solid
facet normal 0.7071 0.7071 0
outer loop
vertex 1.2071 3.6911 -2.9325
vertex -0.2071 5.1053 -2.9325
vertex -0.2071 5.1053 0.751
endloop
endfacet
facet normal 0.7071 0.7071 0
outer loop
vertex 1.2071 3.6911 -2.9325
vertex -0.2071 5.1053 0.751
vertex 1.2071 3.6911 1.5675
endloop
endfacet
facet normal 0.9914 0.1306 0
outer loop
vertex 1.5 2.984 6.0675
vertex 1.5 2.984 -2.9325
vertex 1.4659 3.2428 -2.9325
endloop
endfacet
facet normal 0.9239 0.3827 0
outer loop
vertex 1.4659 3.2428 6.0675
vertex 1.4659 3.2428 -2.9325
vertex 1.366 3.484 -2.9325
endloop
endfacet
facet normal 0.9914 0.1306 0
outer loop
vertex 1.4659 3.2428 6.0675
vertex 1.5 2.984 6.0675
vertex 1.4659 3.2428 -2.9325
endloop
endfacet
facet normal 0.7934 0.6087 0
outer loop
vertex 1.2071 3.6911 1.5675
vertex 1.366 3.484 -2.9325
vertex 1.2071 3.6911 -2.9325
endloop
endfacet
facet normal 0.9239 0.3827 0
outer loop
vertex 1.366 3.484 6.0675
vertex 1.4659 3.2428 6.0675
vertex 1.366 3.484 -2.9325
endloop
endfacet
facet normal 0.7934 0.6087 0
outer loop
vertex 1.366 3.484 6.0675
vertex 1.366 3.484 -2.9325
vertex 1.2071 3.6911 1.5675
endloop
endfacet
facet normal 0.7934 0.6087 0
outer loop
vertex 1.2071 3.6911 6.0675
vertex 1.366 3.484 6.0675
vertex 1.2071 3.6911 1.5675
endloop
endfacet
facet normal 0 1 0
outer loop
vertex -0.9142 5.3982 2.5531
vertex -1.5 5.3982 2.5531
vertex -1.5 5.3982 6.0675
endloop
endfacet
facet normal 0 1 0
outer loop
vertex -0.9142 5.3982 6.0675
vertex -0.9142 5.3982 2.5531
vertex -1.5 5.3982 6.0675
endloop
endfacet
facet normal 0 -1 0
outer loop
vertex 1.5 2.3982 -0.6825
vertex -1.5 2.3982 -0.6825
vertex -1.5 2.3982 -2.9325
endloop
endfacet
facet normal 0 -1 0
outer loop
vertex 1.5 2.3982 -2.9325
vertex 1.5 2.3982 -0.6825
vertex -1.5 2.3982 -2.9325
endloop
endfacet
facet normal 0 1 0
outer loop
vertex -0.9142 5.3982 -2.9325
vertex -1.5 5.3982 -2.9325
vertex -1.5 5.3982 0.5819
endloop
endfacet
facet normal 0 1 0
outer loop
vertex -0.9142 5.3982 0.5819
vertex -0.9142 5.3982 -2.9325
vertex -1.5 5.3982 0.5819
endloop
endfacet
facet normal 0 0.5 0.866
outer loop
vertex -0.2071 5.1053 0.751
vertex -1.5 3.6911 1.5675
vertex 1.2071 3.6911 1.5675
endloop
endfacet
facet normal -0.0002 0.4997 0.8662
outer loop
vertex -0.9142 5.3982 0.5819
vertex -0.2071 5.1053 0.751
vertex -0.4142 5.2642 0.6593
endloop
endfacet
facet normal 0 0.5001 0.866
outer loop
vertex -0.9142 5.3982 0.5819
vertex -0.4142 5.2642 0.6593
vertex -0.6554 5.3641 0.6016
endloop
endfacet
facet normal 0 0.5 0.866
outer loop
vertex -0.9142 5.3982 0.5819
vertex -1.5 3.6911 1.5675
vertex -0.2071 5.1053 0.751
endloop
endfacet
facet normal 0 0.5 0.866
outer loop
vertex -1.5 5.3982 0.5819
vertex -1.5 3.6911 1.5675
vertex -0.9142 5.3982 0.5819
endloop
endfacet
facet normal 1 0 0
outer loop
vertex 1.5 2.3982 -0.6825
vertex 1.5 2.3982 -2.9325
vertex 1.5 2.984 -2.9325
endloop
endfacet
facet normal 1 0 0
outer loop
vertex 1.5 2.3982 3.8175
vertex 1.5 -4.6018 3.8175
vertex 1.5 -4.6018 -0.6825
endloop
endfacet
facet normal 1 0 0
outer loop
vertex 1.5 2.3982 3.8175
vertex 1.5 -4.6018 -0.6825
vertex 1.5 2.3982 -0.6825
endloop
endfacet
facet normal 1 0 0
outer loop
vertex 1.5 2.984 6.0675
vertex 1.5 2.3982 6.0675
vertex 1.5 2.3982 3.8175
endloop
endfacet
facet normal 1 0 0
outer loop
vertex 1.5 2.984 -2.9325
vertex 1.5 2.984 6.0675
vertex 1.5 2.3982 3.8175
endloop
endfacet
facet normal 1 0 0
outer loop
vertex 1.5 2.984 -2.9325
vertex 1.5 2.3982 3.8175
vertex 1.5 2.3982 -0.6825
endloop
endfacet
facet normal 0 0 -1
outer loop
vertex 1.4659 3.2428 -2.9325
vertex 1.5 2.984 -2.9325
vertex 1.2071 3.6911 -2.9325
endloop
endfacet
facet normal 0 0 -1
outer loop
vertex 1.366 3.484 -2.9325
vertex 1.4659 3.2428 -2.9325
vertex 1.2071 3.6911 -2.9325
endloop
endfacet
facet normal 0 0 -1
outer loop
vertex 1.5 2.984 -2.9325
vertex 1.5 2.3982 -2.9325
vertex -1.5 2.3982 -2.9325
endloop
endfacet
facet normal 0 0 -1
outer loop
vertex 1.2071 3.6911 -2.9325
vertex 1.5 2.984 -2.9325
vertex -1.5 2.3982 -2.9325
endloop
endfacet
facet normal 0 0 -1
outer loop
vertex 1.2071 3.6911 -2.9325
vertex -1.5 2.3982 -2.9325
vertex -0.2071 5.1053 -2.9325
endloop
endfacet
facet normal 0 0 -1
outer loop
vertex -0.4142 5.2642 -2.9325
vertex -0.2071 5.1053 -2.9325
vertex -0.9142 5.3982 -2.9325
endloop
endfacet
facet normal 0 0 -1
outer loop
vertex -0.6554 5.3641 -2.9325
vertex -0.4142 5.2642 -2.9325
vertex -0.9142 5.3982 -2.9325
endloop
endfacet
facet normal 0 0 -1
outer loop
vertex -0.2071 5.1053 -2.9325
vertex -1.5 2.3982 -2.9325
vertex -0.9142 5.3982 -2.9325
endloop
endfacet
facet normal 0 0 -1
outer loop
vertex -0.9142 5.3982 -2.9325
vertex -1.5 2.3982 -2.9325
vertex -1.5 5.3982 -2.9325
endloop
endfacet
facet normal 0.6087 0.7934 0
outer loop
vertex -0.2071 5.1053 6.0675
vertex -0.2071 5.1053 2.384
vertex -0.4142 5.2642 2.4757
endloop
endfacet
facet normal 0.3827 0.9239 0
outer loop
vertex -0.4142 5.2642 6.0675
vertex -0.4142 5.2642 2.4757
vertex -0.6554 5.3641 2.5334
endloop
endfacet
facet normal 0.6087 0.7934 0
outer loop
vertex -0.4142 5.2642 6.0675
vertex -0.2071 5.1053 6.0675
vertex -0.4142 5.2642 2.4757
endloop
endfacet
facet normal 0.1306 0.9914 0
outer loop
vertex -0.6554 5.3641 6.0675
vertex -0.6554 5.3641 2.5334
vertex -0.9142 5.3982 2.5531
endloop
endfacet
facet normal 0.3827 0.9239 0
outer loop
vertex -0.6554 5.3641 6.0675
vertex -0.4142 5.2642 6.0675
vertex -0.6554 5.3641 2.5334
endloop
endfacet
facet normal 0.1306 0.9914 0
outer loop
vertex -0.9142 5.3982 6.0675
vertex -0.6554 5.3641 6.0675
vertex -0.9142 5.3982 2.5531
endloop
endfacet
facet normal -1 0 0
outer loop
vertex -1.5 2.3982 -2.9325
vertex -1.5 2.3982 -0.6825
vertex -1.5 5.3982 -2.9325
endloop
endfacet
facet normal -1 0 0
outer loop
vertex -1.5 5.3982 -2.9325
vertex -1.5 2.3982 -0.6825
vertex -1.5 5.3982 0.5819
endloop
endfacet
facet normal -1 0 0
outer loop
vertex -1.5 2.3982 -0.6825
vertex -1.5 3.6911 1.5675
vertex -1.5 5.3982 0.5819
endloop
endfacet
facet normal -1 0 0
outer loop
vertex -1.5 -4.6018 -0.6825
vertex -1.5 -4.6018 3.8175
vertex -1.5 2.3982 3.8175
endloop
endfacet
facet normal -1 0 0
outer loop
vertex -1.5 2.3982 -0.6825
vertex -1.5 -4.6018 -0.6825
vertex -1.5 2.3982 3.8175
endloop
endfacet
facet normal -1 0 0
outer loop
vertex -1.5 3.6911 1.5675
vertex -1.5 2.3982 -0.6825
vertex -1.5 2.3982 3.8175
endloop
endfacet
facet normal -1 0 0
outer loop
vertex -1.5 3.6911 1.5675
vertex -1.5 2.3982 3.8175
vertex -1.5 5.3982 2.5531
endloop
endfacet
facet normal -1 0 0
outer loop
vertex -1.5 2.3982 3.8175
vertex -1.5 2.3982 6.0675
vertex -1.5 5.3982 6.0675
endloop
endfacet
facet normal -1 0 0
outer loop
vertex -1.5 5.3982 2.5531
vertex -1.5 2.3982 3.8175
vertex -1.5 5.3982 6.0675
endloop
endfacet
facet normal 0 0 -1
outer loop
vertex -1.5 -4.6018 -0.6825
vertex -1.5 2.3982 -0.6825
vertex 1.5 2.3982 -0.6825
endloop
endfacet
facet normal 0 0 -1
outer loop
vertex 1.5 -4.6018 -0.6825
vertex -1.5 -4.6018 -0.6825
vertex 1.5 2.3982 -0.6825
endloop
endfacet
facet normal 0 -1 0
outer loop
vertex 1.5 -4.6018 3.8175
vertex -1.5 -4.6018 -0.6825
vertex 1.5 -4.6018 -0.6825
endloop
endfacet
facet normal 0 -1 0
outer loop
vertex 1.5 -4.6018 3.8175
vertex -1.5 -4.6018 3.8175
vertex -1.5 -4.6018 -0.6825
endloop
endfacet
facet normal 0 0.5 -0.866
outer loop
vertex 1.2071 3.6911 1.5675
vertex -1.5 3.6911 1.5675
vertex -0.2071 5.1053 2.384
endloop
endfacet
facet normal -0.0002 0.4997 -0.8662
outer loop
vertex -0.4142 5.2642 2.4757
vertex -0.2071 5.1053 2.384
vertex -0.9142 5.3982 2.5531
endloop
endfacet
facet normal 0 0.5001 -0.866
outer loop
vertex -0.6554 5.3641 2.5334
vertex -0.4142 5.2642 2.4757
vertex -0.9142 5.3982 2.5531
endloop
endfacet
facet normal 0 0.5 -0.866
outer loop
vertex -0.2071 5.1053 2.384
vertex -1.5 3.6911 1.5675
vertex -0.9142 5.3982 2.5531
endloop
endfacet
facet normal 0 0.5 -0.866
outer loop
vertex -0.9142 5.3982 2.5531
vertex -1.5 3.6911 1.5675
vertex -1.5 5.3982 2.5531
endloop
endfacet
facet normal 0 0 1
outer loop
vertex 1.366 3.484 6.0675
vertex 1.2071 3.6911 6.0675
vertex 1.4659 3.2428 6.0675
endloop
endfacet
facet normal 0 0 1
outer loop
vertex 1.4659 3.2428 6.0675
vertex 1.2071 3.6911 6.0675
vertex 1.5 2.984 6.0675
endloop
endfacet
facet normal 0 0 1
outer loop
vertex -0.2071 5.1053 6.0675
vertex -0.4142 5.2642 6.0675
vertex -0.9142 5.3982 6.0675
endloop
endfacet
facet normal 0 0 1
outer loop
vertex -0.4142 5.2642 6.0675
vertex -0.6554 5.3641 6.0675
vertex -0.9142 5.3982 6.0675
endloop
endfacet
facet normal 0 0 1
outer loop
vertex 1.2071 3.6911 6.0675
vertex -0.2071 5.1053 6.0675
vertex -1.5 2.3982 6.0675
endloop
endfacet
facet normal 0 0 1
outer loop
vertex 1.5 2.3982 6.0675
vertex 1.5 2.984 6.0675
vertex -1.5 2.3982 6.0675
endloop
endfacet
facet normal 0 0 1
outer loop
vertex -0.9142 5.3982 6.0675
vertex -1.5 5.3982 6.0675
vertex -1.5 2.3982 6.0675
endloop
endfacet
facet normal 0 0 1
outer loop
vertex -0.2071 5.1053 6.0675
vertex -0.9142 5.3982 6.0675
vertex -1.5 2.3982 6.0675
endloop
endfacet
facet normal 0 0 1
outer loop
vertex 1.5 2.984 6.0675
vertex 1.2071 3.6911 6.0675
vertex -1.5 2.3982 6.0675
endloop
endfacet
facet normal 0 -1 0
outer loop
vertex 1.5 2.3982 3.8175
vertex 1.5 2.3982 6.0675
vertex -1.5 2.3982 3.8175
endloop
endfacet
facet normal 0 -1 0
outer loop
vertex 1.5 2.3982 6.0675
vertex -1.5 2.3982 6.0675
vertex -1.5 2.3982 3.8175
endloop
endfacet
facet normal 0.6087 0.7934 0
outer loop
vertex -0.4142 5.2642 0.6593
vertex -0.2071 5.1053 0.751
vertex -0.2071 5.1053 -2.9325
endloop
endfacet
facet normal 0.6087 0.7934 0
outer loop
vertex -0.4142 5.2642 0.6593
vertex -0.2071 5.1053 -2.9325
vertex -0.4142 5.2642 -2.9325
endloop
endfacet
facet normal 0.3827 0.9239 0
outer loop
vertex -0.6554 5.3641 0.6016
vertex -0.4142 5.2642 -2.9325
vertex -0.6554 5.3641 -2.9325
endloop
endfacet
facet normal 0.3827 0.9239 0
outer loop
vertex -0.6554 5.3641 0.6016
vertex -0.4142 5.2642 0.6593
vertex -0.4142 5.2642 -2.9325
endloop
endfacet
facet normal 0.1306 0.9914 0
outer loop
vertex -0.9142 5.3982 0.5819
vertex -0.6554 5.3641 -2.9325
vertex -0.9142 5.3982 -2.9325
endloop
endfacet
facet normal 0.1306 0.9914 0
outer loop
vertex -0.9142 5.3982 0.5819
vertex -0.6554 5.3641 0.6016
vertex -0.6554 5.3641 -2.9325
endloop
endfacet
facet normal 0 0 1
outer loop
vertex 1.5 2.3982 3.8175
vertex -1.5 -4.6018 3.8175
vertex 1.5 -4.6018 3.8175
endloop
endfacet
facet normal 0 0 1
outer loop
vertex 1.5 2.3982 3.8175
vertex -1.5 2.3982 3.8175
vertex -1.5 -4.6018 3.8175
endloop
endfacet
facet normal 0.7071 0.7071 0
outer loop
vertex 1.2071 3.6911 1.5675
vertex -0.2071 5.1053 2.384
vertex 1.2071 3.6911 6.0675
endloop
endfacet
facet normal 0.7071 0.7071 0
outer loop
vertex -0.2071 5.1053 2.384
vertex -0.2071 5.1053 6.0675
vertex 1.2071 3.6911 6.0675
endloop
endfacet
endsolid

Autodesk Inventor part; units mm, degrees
ref_plane "YZ Plane" through (0, 0, 0) normal (1, 0, 0) x (0, 1, 0)
ref_plane "XZ Plane" through (0, 0, 0) normal (0, 1, 0) x (-1, 0, 0)
ref_plane "XY Plane" through (0, 0, 0) normal (0, 0, 1) x (1, 0, 0)
sketch "Sketch1" plane through (0, 0, 0) normal (1, 0, 0) x (0, 1, 0)
  line L0 (5.3982, 6.0675) -> (2.3982, 6.0675)
  line L1 (2.3982, 6.0675) -> (2.3982, -2.9325)
  line L2 (2.3982, -2.9325) -> (5.3982, -2.9325)
  line L3 (5.3982, -2.9325) -> (5.3982, 6.0675)
  point P0 (0, 0)
  dimension "d0" = 3
  dimension "d1" = 9
extrude "Extrusion1" add sketch "Sketch1" along normal mid plane 3
sketch "Sketch2" plane through (-1.5, 2.3982, 6.0675) normal (0, 0, 1) x (1, 0, 0)
  line L0 (0, 3) -> (3, 3) projected
  line L1 (0, 3) -> (0.5858, 3)
  line L2 (3, 3) -> (3, 0) projected
  line L3 (3, 0) -> (3, 0.5858)
  line L4 (1.2929, 2.7071) -> (2.7071, 1.2929)
  arc A0 (1.2929, 2.7071) -> (0.5858, 3) centre (0.5858, 2) ccw
  arc A1 (3, 0.5858) -> (2.7071, 1.2929) centre (2, 0.5858) ccw
  line L5 (0.5858, 3) -> (3, 3)
  arc A2 (1.2929, 2.7071) -> (0.5858, 3) centre (0.5858, 2) ccw
  arc A3 (3, 0.5858) -> (2.7071, 1.2929) centre (2, 0.5858) ccw
  line L6 (3, 3) -> (3, 0.5858)
  point P0 (1.5, -2.3982)
  point P1 (1, 3)
  point P2 (3, 1)
  dimension "d5" = 1
extrude "Extrusion2" cut sketch "Sketch2" against normal blind 50
sketch "Sketch4" plane through (-1.5, 0, 0) normal (-1, 0, 0) x (0, 0, 1)
  line L0 (6.0675, 5.3982) -> (-2.9325, 5.3982) projected
  line L1 (6.0675, 2.3982) -> (-2.9325, 2.3982) projected
  line L2 (6.0675, 3.6911) -> (-2.9325, 3.6911) projected
  line L3 (1.5675, 3.6911) -> (2.5531, 5.3982)
  line L4 (1.5675, 3.6911) -> (3.5387, 3.6911) construction
  line L5 (1.5675, 3.6911) -> (0.5819, 5.3982)
  line L6 (0.5819, 5.3982) -> (2.5531, 5.3982)
  point P0 (0, 0)
  dimension "d10" = 60
extrude "Extrusion3" cut sketch "Sketch4" against normal blind 50
sketch "Sketch5" plane through (-1.5, 2.3982, -2.9325) normal (0, -1, 0) x (1, 0, 0)
  line L0 (3, 9) -> (3, 0) projected
  line L1 (0, 0) -> (0, 9) projected
  line L2 (0, 6.75) -> (3, 6.75)
  line L3 (0, 2.25) -> (3, 2.25)
  line L4 (0, 2.25) -> (0, 6.75)
  line L5 (3, 2.25) -> (3, 6.75)
  point P0 (1.5, 2.9325)
  point P1 (0, 4.5)
extrude "Extrusion4" add sketch "Sketch5" along normal blind 7
properties part number "parte do segurador de portas"
